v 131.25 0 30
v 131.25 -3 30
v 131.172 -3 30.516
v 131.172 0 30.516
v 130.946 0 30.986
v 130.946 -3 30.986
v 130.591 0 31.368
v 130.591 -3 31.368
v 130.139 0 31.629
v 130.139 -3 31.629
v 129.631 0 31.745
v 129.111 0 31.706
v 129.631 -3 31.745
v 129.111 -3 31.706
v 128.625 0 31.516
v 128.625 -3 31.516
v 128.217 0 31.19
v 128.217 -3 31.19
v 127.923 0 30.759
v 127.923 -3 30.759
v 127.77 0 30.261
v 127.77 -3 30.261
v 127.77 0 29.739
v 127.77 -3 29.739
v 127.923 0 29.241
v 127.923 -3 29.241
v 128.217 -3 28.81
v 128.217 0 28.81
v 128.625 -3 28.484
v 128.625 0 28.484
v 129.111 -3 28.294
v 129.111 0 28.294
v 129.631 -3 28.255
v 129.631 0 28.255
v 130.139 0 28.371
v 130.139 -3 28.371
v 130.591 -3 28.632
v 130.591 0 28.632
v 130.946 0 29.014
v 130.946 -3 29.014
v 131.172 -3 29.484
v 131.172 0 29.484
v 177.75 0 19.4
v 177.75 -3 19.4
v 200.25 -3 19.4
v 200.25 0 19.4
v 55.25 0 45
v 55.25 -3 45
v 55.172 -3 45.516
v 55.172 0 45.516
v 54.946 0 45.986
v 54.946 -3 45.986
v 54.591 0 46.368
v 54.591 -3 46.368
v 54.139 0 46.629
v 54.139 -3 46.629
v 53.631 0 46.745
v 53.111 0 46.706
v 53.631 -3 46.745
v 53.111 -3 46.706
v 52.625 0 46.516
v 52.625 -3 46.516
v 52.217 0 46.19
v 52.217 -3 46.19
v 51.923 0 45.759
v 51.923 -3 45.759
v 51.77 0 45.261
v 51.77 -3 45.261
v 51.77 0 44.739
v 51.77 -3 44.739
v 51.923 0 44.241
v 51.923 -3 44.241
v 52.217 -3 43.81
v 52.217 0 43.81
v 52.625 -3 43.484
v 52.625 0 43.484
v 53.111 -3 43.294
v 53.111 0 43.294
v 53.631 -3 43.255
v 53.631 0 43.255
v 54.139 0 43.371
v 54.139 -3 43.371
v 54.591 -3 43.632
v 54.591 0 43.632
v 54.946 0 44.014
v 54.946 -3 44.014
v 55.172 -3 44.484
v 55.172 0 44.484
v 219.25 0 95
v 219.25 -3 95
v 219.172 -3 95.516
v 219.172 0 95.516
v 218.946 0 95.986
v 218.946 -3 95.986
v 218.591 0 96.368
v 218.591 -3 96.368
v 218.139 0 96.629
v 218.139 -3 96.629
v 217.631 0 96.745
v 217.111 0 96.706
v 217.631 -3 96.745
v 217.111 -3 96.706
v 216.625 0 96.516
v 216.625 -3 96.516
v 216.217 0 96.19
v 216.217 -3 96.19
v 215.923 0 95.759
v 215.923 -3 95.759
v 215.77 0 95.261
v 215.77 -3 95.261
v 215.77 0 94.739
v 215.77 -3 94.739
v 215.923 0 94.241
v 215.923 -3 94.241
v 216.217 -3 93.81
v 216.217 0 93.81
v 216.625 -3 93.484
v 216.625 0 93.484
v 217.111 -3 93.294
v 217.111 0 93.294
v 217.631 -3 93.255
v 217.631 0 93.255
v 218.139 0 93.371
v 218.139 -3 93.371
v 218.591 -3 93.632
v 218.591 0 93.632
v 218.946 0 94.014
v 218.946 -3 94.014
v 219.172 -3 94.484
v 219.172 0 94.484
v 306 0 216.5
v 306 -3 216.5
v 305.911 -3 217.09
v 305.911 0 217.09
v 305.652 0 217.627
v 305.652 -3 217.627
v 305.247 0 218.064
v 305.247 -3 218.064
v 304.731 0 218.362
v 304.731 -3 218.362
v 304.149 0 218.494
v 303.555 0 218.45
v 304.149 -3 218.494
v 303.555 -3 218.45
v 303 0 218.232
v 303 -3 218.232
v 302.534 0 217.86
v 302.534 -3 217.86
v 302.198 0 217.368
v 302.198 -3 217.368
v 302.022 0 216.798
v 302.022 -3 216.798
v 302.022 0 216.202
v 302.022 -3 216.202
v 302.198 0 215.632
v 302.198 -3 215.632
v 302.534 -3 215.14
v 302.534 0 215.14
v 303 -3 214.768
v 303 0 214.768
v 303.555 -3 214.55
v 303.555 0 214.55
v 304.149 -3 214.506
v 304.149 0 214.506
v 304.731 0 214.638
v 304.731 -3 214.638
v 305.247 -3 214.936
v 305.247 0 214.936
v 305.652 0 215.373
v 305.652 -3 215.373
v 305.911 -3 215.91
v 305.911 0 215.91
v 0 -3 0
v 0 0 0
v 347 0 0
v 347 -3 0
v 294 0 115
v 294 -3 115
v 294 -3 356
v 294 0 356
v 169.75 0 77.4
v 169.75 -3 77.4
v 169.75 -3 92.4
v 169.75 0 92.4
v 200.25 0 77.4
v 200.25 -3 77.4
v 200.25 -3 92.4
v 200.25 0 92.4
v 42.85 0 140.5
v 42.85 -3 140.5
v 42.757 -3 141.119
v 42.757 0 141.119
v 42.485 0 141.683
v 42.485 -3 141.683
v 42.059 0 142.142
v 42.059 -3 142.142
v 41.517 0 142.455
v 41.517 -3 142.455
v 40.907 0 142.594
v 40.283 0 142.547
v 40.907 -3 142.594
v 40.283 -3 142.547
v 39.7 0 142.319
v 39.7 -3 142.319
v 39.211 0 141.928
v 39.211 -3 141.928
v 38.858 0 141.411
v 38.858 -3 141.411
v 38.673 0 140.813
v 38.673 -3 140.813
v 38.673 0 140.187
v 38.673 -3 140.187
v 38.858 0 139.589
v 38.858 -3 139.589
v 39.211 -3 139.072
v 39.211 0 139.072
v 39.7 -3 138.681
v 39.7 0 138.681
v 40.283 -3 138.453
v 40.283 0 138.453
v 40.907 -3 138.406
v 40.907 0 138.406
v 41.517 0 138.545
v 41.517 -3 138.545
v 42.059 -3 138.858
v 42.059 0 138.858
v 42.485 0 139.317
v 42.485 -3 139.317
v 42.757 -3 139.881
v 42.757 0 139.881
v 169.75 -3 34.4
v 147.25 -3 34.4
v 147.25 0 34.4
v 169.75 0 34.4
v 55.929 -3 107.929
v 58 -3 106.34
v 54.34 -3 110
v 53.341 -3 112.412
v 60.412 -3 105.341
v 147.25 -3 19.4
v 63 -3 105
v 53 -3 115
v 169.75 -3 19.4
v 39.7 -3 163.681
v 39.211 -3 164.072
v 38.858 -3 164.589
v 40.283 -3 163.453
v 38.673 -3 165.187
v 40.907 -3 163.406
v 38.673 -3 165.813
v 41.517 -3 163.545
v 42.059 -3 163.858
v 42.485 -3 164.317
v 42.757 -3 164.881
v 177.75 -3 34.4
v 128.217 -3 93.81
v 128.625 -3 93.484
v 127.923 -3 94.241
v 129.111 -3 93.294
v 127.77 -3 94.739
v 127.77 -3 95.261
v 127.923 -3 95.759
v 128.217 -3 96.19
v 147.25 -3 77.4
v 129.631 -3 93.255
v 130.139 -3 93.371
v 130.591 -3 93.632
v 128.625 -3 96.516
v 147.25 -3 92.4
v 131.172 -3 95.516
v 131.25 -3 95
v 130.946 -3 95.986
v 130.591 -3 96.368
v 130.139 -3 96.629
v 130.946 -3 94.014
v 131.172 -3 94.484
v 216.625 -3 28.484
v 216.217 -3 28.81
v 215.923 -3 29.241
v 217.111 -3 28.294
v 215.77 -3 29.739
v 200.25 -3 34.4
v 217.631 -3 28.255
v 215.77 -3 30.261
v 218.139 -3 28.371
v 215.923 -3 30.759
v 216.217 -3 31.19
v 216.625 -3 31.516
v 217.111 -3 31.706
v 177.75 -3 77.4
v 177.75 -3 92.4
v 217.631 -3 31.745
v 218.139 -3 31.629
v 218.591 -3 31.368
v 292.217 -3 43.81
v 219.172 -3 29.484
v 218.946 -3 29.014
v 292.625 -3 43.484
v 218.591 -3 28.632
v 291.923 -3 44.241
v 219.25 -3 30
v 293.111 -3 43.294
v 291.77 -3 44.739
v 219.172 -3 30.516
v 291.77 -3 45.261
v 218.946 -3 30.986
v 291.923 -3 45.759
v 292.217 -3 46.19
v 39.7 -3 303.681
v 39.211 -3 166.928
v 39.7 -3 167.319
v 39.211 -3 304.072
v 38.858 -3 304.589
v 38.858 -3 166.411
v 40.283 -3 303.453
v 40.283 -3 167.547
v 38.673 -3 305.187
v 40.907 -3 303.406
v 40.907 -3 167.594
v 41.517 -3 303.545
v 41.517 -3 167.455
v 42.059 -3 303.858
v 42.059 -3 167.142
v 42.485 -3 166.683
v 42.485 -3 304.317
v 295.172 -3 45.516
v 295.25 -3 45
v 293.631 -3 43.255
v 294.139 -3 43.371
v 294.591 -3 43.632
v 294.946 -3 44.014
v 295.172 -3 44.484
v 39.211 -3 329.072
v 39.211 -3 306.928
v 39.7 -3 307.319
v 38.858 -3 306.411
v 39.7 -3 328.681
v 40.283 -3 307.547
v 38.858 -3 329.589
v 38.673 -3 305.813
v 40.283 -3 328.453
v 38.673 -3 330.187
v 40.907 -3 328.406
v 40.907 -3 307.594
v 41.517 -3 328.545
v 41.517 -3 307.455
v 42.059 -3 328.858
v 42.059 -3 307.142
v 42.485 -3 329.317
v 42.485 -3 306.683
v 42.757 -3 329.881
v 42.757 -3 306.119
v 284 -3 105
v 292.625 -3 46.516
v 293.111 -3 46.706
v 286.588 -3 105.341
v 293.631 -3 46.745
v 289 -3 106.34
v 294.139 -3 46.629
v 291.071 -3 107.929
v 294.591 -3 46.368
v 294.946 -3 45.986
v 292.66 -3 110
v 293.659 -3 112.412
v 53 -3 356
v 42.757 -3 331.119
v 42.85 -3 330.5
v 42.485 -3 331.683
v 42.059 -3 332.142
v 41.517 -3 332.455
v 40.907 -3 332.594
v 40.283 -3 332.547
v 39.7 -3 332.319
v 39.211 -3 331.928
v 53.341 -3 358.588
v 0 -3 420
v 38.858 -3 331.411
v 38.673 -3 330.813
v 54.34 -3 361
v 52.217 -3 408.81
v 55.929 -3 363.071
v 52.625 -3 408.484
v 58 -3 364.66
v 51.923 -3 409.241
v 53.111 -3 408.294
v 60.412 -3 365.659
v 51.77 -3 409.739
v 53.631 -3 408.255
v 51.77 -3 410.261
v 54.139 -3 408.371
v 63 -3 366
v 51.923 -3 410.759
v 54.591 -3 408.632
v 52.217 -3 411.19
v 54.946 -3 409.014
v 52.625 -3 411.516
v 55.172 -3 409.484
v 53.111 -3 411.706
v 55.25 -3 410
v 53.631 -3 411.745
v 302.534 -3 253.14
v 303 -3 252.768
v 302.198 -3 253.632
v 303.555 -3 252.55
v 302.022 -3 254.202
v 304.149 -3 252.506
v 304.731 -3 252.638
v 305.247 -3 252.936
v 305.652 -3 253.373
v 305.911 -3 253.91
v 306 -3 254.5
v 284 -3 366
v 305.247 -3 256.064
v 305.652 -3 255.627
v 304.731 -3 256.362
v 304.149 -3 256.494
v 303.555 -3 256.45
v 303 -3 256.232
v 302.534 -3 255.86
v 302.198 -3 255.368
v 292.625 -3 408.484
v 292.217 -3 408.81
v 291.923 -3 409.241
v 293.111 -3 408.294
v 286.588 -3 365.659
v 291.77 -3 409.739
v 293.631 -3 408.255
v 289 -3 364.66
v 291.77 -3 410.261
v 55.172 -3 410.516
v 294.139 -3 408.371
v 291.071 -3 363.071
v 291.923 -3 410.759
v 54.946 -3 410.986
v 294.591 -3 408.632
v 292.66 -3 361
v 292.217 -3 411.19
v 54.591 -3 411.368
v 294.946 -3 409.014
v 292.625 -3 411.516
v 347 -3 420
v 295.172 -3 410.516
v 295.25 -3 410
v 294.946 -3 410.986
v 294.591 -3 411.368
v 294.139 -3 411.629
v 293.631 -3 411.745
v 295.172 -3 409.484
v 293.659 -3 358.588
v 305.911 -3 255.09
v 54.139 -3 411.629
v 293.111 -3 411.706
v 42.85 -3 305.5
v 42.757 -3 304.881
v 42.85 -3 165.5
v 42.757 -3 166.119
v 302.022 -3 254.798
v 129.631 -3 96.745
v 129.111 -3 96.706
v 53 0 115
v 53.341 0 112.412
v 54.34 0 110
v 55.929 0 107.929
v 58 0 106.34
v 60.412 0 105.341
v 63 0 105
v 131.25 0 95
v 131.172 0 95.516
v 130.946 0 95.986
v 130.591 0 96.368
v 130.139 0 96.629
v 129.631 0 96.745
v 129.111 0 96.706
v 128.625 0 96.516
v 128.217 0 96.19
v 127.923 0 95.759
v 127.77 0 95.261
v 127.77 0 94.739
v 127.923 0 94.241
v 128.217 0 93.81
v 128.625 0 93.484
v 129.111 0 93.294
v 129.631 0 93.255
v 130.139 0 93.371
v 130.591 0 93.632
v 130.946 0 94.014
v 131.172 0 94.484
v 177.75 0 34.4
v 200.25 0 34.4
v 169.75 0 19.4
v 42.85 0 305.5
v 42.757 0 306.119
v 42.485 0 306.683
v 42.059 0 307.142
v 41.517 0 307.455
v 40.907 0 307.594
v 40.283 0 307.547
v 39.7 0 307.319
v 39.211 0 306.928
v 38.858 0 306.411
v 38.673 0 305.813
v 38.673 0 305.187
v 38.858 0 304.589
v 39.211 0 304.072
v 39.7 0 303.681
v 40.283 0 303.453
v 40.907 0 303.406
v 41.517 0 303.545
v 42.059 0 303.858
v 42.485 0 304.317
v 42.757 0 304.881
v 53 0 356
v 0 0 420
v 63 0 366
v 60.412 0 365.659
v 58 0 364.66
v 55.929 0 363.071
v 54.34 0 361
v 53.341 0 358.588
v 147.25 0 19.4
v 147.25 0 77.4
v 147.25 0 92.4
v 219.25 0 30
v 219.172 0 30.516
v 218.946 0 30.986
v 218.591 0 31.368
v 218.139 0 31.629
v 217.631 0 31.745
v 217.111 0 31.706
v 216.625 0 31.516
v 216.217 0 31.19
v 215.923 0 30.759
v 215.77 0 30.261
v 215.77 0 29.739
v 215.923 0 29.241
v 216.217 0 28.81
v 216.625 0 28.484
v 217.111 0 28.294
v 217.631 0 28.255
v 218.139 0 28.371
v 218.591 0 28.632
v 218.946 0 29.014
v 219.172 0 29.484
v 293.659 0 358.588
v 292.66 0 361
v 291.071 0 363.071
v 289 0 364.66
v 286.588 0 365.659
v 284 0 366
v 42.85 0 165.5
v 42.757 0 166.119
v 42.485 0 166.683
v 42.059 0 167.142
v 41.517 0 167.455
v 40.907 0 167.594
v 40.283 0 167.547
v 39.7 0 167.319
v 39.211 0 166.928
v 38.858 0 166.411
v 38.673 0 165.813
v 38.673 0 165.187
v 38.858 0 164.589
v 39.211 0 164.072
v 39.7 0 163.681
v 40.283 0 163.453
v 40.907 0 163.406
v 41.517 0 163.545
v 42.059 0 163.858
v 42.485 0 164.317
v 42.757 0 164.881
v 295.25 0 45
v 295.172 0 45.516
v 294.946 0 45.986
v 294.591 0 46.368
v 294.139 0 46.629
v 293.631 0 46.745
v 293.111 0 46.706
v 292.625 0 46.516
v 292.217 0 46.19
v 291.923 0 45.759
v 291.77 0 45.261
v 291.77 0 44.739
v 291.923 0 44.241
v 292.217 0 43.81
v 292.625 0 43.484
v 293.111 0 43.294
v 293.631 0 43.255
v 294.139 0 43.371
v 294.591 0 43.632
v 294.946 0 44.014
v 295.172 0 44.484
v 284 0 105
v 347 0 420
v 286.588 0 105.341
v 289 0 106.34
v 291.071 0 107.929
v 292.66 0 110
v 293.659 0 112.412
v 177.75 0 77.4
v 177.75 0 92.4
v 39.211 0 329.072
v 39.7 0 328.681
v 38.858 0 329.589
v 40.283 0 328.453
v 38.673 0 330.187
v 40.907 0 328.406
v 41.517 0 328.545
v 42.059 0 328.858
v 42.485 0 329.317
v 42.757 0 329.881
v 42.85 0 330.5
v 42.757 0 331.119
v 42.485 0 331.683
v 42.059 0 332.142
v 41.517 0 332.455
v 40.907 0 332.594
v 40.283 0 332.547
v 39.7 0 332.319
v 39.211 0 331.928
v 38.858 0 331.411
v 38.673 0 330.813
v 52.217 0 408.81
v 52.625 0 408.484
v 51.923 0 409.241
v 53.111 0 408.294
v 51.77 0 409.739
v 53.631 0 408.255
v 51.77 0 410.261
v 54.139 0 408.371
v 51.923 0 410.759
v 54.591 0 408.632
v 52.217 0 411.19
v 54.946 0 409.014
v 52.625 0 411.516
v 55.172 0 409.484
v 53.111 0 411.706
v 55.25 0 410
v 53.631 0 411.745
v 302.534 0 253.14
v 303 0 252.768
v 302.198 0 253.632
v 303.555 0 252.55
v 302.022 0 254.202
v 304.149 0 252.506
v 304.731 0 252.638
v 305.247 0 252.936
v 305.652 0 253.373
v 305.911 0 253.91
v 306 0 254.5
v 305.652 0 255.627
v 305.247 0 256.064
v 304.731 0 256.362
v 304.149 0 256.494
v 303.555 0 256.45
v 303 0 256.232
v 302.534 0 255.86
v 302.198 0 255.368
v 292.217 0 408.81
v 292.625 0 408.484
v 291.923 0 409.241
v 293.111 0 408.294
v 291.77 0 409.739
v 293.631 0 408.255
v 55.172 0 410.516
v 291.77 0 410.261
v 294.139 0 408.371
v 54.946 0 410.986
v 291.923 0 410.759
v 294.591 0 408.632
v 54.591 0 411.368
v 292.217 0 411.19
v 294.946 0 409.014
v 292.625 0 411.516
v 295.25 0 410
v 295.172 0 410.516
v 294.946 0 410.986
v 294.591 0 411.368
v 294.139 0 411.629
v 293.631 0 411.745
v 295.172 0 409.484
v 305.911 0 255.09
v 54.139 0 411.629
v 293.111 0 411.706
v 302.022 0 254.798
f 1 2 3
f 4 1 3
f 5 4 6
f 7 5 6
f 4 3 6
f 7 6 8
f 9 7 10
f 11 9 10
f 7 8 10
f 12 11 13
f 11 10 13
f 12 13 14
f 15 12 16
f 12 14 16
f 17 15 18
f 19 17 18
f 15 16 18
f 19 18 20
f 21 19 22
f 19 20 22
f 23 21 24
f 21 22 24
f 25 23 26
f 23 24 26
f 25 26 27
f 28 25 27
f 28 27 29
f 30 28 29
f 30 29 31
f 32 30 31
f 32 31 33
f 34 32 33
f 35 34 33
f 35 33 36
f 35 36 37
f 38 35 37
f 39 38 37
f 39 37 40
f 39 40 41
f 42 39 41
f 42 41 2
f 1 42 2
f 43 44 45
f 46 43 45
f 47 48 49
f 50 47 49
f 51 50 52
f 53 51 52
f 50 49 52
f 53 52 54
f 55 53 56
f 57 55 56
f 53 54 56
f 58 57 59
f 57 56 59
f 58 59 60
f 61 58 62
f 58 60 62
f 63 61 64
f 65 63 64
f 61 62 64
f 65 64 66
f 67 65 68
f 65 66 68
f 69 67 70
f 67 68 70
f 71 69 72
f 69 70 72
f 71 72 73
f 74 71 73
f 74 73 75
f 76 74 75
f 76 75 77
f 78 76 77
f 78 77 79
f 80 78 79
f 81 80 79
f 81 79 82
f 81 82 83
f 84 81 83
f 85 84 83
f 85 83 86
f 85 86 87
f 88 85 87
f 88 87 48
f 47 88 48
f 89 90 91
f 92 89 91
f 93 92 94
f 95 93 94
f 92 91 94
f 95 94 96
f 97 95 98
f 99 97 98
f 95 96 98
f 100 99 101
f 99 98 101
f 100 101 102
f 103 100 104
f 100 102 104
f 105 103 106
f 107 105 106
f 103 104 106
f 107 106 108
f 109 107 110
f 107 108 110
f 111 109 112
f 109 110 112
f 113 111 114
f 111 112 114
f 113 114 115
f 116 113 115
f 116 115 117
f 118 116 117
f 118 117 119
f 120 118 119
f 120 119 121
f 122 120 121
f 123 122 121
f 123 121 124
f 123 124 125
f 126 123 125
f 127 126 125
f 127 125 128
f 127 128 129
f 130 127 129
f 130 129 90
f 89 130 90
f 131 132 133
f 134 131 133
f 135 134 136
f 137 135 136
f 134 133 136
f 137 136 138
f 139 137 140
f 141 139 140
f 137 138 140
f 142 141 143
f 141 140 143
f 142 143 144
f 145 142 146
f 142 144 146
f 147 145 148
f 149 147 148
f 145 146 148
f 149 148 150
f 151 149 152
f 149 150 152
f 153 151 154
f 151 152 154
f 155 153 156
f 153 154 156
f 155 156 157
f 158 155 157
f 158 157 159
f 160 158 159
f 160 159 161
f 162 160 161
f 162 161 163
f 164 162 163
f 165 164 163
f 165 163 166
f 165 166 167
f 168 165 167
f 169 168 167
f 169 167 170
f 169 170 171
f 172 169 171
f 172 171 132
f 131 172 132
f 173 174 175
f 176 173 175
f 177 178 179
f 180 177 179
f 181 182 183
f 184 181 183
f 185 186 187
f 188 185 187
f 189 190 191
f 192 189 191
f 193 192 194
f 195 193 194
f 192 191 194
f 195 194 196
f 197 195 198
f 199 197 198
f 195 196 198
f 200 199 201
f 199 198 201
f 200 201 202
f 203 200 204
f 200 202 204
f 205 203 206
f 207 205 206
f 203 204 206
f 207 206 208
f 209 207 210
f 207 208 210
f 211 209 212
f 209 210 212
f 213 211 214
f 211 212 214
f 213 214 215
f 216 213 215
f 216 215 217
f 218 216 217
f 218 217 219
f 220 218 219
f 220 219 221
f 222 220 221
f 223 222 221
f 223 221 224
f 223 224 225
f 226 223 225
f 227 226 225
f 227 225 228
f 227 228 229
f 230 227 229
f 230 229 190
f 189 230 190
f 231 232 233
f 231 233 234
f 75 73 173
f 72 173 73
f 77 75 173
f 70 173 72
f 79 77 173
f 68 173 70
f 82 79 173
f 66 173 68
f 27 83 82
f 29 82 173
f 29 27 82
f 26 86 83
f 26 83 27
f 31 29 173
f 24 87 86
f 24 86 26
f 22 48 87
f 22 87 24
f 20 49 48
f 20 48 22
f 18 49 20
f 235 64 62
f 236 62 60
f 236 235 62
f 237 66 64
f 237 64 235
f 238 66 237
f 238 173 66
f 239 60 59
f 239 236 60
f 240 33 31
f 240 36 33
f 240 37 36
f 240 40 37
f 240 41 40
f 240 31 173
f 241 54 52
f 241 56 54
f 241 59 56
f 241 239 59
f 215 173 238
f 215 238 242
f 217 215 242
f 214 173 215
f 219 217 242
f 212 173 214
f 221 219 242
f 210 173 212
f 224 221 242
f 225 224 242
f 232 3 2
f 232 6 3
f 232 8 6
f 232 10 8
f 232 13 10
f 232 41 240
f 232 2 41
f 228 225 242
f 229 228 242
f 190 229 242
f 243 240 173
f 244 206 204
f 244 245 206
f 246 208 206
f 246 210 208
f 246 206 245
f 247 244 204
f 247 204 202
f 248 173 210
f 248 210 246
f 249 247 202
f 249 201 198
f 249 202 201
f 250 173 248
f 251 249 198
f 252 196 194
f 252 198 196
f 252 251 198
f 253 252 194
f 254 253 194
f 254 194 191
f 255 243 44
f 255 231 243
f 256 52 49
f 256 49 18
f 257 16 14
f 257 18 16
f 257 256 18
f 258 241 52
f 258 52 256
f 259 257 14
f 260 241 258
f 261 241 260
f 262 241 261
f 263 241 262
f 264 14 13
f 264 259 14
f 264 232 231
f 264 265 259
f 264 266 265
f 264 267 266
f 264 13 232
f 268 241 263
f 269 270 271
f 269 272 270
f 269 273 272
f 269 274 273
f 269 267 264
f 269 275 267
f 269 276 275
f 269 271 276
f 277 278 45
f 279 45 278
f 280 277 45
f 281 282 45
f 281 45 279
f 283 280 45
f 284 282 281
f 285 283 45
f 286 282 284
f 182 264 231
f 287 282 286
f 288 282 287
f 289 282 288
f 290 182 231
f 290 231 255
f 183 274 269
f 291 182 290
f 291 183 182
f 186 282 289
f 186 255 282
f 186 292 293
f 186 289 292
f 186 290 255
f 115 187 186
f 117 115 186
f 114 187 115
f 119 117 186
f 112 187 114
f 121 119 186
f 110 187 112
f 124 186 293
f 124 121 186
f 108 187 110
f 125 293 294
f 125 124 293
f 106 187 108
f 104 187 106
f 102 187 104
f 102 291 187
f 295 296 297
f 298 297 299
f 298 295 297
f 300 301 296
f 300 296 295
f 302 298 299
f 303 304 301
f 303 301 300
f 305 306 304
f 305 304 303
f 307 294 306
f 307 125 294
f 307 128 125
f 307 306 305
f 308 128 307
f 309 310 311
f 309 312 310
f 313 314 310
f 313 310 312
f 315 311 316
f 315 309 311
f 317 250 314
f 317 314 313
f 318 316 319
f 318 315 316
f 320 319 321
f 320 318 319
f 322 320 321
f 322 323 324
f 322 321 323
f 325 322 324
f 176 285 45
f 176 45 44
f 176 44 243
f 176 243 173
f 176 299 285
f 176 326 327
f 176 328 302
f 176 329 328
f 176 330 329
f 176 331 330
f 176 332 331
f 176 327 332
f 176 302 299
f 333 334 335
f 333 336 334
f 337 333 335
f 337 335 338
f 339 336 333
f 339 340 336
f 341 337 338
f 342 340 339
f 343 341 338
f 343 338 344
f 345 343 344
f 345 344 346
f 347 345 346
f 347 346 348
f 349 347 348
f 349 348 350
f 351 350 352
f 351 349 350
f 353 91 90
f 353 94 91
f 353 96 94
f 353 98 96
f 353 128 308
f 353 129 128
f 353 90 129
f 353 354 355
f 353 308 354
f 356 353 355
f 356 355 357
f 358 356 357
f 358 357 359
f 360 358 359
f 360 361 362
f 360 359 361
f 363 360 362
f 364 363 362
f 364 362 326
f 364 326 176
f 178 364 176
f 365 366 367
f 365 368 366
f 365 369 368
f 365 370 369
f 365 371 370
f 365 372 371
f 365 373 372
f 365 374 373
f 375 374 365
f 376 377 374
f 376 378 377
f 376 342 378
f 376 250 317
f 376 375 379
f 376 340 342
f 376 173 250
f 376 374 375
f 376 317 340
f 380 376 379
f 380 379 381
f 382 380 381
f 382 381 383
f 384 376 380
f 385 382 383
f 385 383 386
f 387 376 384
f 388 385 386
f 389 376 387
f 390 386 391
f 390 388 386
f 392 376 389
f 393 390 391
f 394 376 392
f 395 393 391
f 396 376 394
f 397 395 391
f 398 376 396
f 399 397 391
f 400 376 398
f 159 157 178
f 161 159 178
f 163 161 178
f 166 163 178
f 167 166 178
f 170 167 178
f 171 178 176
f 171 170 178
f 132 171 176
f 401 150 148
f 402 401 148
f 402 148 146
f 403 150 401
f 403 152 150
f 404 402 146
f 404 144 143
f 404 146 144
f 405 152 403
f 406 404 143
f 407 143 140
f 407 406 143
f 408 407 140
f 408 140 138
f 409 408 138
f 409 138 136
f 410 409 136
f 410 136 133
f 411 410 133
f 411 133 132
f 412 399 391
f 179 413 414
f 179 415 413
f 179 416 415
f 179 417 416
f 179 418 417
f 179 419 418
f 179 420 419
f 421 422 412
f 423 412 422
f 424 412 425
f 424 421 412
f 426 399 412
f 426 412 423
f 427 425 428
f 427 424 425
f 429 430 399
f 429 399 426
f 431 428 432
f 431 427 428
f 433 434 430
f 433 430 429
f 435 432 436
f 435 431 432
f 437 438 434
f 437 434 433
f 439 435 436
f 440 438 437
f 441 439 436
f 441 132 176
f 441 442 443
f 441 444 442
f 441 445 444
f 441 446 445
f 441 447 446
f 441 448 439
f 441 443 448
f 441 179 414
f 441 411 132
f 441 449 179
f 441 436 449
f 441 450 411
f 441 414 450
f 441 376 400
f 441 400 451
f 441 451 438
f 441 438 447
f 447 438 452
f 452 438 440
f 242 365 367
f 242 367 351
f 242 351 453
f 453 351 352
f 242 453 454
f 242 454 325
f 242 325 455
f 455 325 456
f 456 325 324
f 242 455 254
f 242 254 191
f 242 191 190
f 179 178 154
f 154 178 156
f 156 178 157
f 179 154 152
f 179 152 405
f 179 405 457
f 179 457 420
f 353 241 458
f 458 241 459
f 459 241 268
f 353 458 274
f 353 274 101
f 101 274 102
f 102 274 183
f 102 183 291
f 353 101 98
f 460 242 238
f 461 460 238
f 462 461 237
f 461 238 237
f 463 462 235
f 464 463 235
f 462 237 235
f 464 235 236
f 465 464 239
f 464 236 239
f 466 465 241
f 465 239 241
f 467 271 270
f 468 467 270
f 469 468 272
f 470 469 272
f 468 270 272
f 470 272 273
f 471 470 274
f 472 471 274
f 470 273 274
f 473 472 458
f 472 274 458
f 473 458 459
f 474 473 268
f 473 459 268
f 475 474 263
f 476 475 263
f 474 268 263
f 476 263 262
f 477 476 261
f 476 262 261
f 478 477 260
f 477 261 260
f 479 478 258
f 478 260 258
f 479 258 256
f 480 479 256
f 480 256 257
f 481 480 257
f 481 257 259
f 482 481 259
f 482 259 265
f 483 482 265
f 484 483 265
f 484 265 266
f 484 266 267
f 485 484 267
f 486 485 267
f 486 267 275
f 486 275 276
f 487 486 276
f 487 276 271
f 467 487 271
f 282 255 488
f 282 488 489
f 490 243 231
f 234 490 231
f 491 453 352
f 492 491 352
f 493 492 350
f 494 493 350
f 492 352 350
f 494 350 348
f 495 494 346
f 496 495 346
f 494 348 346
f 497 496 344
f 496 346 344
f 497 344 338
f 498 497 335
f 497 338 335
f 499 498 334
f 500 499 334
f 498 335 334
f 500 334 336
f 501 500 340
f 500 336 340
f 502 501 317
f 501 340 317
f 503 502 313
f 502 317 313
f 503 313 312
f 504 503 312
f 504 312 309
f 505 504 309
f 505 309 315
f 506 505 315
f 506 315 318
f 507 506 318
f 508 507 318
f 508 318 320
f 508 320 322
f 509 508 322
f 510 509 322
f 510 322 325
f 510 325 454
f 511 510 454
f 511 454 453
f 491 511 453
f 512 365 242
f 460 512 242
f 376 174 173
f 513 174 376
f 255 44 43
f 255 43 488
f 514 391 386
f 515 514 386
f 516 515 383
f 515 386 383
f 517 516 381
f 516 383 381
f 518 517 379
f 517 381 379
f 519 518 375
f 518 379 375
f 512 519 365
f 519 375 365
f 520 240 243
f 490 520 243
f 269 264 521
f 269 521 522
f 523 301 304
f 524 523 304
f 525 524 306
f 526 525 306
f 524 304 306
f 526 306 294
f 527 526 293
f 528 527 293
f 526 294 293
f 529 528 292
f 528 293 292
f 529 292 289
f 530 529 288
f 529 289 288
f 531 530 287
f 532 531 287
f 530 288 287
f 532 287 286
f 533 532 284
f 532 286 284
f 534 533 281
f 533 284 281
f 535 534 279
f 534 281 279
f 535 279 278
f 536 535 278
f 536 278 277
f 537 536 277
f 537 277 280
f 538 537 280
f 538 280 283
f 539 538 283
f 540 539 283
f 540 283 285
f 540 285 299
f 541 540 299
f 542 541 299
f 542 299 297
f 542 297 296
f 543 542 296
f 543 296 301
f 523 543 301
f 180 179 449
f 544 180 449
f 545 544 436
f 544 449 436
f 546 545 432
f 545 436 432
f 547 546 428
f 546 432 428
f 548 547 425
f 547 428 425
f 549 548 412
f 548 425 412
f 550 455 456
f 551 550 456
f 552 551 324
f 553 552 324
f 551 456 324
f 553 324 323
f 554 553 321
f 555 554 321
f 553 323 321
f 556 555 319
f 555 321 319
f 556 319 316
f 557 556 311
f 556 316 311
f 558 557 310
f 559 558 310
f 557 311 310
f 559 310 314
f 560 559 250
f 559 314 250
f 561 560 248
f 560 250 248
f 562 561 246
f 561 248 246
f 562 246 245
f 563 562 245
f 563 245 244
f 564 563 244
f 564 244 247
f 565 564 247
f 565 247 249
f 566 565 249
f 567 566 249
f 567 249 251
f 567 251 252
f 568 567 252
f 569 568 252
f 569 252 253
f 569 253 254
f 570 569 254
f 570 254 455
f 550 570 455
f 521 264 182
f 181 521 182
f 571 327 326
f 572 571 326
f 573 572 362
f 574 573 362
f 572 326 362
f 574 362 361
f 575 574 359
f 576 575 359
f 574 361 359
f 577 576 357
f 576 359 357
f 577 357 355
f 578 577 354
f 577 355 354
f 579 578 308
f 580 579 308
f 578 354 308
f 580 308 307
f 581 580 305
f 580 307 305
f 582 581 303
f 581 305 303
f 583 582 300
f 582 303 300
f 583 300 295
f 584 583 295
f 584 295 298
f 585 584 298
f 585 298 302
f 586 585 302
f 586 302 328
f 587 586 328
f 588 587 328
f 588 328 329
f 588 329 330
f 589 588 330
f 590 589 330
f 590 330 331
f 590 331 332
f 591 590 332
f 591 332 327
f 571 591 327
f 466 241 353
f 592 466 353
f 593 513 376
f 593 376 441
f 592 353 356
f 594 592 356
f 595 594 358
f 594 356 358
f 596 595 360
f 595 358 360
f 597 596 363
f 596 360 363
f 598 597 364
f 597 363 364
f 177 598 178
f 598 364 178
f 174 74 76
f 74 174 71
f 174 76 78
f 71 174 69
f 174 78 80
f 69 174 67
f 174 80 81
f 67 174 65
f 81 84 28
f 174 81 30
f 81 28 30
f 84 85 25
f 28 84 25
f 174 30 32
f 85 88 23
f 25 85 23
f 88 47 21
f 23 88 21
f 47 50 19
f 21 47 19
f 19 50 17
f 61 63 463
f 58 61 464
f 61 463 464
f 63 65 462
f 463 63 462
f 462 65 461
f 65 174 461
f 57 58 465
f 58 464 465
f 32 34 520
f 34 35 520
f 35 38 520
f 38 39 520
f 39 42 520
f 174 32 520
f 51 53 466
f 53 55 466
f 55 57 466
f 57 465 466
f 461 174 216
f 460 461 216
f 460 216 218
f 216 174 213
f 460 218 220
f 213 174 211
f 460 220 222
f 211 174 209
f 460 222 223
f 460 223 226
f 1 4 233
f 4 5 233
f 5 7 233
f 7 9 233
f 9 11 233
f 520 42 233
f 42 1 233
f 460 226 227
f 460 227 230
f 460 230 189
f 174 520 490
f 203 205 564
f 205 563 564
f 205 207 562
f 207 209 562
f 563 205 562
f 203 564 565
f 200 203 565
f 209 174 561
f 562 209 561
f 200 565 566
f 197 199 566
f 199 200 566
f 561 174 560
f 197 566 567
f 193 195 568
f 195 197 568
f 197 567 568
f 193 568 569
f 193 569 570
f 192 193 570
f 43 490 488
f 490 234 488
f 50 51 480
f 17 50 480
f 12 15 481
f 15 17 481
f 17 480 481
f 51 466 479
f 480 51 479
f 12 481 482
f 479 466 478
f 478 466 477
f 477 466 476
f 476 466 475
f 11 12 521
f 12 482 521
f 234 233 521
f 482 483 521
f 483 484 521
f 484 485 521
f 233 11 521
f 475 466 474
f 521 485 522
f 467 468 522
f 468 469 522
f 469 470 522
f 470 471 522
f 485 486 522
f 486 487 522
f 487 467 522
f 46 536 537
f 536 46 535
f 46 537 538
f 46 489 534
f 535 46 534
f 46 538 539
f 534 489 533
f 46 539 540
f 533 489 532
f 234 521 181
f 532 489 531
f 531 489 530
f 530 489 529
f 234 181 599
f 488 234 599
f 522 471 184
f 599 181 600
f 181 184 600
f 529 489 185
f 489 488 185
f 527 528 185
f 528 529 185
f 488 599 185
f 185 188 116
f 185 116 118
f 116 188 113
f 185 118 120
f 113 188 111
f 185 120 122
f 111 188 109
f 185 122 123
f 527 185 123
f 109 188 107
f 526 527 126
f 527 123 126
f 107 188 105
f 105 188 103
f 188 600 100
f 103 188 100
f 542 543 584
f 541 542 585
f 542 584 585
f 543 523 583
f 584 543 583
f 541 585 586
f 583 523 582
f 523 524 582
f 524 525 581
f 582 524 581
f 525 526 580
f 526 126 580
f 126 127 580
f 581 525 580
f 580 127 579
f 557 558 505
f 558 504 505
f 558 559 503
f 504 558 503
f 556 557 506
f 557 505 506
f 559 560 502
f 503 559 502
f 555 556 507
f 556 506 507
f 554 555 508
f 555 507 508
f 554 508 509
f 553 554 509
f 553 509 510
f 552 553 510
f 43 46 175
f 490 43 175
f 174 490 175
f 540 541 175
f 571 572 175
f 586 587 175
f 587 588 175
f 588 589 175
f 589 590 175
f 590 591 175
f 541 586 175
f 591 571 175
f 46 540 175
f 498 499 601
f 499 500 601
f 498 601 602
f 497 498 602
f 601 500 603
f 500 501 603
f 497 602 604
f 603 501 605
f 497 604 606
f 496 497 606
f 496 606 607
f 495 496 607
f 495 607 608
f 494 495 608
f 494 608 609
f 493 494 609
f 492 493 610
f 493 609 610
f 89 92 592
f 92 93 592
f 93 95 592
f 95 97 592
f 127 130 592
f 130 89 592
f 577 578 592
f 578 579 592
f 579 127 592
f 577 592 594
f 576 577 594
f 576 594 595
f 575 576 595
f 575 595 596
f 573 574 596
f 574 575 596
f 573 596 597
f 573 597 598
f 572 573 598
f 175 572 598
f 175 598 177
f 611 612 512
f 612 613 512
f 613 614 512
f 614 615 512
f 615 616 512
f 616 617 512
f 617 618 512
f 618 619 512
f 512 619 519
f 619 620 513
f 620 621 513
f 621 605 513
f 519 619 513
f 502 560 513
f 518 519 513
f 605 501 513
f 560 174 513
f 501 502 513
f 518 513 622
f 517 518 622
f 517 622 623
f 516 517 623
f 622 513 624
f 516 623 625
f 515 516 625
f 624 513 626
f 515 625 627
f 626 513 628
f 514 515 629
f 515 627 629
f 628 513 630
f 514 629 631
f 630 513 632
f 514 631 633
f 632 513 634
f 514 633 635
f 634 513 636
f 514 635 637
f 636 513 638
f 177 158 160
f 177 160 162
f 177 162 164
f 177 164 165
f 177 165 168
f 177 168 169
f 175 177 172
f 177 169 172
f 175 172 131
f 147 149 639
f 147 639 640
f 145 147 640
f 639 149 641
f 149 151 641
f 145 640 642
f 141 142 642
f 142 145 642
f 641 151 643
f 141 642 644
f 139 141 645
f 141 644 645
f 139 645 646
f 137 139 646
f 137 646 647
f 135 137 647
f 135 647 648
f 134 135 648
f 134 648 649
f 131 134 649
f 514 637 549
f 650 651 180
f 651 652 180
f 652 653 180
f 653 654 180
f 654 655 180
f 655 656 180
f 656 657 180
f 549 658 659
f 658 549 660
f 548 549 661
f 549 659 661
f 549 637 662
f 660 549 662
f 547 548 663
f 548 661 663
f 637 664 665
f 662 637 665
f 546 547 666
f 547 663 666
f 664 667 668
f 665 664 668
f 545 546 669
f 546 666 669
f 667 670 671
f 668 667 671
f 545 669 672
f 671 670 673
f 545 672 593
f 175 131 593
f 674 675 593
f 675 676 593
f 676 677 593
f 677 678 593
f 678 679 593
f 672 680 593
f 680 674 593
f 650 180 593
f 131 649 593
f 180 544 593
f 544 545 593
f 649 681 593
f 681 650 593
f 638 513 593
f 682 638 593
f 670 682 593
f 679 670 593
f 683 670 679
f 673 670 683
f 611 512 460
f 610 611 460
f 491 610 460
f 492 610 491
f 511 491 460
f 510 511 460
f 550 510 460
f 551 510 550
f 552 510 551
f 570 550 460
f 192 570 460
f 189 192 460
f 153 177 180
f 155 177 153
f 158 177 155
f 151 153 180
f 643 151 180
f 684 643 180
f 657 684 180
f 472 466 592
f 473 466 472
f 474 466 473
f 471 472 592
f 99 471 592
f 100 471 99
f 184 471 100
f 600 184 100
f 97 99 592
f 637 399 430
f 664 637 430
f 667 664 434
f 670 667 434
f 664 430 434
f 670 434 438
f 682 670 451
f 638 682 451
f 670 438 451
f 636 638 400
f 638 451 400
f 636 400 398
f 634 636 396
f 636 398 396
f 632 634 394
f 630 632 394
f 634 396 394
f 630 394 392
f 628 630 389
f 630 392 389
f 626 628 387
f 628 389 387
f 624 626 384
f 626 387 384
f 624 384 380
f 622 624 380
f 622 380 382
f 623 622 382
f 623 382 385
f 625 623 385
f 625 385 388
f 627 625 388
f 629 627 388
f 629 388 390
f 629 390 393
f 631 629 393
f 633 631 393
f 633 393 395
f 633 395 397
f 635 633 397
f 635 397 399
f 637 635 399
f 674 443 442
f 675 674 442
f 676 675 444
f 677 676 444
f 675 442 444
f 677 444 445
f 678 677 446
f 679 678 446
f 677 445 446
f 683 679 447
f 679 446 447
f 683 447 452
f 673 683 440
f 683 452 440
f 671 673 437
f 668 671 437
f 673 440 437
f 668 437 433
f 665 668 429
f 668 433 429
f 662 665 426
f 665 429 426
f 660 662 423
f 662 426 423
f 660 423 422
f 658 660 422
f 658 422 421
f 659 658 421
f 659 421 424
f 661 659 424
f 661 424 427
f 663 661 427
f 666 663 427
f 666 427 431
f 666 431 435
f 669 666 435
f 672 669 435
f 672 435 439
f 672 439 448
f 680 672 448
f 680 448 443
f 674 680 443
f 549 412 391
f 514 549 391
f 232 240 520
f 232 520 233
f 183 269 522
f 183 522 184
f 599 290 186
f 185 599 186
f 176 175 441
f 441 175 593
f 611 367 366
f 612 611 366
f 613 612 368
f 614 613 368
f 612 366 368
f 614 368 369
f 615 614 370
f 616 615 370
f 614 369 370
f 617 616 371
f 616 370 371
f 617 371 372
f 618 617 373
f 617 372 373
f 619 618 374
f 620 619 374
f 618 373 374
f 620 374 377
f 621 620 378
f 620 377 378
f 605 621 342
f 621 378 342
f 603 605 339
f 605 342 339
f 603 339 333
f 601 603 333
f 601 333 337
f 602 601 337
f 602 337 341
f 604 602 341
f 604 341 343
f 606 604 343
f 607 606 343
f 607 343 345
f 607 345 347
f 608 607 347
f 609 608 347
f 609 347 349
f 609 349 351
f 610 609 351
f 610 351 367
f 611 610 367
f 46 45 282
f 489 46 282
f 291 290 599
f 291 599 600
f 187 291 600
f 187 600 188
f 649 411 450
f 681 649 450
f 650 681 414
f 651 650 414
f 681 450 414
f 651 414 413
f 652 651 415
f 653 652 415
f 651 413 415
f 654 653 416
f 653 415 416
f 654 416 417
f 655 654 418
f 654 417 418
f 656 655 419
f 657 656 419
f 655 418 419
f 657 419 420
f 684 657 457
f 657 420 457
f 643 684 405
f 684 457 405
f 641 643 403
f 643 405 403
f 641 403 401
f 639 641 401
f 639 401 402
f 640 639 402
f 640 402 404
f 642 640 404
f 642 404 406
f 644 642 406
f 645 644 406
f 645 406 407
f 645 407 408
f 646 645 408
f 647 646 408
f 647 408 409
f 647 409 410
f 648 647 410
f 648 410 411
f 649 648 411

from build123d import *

# Parameters (mm, degrees)
SKETCH_W            = 347
SKETCH_H            = 420
PAD_DEPTH           = 3
SKETCH001_R         = 1.75
POCKET_DEPTH        = 3.001
POCKET001_DEPTH     = 5
SKETCH003_R         = 1.75
POCKET002_DEPTH     = 3.001
SKETCH005_W         = 22.5
SKETCH005_H         = 15
POCKET003_DEPTH     = 3
LINEARPATTERN_COUNT = 2
LINEARPATTERN_PITCH = 58
SKETCH006_R         = 2.1
SKETCH006_R_2       = 2
POCKET004_DEPTH     = 3.001


with BuildPart() as part:
    # Sketch → Pad (new body)
    with BuildSketch(Plane.XZ):
        with Locations((173.5, 210)):
            Rectangle(SKETCH_W, SKETCH_H)
    extrude(amount=PAD_DEPTH)

    # Sketch001 (on Face6 of Pad) → Pocket (cut, through all)
    with BuildSketch(Plane.XZ.offset(3)):
        with Locations((53.5, 45)):
            Circle(SKETCH001_R)
        with Locations((293.5, 45)):
            Circle(SKETCH001_R)
        with Locations((293.5, 410)):
            Circle(SKETCH001_R)
        with Locations((53.5, 410)):
            Circle(SKETCH001_R)
    extrude(amount=-POCKET_DEPTH, mode=Mode.SUBTRACT)

    # Sketch002 (on Face5 of Pocket) → Pocket001 (cut)
    with BuildSketch(Plane.XZ.offset(3)):
        with BuildLine():
            Line((53, 356), (53, 115))
            ThreePointArc((53, 115), (55.928932, 107.928932), (63, 105))
            Line((63, 105), (284, 105))
            ThreePointArc((284, 105), (291.071068, 107.928932), (294, 115))
            Line((294, 115), (294, 356))
            ThreePointArc((294, 356), (291.071068, 363.071068), (284, 366))
            Line((284, 366), (63, 366))
            ThreePointArc((63, 366), (55.928932, 363.071068), (53, 356))
        make_face()
    extrude(amount=-POCKET001_DEPTH, mode=Mode.SUBTRACT)

    # Sketch003 (on Face5 of Pocket001) → Pocket002 (cut, through all)
    with BuildSketch(Plane.XZ.offset(3)):
        with Locations((129.5, 30)):
            Circle(SKETCH003_R)
        with Locations((129.5, 95)):
            Circle(SKETCH003_R)
        with Locations((217.5, 95)):
            Circle(SKETCH003_R)
        with Locations((217.5, 30)):
            Circle(SKETCH003_R)
    extrude(amount=-POCKET002_DEPTH, mode=Mode.SUBTRACT)

    # Sketch005 (on Face5 of Pocket002) → Pocket003 (cut)
    with BuildSketch(Plane.XZ.offset(3)):
        with Locations((158.5, 84.9)):
            Rectangle(SKETCH005_W, SKETCH005_H)
        with Locations((189, 84.9)):
            Rectangle(SKETCH005_W, SKETCH005_H)
    pocket003 = extrude(amount=-POCKET003_DEPTH, mode=Mode.SUBTRACT)

    # LinearPattern: Pocket003 ×2
    with Locations(*[(0, 0, -i * LINEARPATTERN_PITCH) for i in range(1, LINEARPATTERN_COUNT)]):
        add(pocket003, mode=Mode.SUBTRACT)

    # Sketch006 (on Face5 of LinearPattern) → Pocket004 (cut, through all)
    with BuildSketch(Plane.XZ.offset(3)):
        with Locations((40.75, 330.5)):
            Circle(SKETCH006_R)
        with Locations((40.75, 305.5)):
            Circle(SKETCH006_R)
        with Locations((40.75, 165.5)):
            Circle(SKETCH006_R)
        with Locations((40.75, 140.5)):
            Circle(SKETCH006_R)
        with Locations((304, 254.5)):
            Circle(SKETCH006_R_2)
        with Locations((304, 216.5)):
            Circle(SKETCH006_R_2)
    extrude(amount=-POCKET004_DEPTH, mode=Mode.SUBTRACT)


solid = part.part
